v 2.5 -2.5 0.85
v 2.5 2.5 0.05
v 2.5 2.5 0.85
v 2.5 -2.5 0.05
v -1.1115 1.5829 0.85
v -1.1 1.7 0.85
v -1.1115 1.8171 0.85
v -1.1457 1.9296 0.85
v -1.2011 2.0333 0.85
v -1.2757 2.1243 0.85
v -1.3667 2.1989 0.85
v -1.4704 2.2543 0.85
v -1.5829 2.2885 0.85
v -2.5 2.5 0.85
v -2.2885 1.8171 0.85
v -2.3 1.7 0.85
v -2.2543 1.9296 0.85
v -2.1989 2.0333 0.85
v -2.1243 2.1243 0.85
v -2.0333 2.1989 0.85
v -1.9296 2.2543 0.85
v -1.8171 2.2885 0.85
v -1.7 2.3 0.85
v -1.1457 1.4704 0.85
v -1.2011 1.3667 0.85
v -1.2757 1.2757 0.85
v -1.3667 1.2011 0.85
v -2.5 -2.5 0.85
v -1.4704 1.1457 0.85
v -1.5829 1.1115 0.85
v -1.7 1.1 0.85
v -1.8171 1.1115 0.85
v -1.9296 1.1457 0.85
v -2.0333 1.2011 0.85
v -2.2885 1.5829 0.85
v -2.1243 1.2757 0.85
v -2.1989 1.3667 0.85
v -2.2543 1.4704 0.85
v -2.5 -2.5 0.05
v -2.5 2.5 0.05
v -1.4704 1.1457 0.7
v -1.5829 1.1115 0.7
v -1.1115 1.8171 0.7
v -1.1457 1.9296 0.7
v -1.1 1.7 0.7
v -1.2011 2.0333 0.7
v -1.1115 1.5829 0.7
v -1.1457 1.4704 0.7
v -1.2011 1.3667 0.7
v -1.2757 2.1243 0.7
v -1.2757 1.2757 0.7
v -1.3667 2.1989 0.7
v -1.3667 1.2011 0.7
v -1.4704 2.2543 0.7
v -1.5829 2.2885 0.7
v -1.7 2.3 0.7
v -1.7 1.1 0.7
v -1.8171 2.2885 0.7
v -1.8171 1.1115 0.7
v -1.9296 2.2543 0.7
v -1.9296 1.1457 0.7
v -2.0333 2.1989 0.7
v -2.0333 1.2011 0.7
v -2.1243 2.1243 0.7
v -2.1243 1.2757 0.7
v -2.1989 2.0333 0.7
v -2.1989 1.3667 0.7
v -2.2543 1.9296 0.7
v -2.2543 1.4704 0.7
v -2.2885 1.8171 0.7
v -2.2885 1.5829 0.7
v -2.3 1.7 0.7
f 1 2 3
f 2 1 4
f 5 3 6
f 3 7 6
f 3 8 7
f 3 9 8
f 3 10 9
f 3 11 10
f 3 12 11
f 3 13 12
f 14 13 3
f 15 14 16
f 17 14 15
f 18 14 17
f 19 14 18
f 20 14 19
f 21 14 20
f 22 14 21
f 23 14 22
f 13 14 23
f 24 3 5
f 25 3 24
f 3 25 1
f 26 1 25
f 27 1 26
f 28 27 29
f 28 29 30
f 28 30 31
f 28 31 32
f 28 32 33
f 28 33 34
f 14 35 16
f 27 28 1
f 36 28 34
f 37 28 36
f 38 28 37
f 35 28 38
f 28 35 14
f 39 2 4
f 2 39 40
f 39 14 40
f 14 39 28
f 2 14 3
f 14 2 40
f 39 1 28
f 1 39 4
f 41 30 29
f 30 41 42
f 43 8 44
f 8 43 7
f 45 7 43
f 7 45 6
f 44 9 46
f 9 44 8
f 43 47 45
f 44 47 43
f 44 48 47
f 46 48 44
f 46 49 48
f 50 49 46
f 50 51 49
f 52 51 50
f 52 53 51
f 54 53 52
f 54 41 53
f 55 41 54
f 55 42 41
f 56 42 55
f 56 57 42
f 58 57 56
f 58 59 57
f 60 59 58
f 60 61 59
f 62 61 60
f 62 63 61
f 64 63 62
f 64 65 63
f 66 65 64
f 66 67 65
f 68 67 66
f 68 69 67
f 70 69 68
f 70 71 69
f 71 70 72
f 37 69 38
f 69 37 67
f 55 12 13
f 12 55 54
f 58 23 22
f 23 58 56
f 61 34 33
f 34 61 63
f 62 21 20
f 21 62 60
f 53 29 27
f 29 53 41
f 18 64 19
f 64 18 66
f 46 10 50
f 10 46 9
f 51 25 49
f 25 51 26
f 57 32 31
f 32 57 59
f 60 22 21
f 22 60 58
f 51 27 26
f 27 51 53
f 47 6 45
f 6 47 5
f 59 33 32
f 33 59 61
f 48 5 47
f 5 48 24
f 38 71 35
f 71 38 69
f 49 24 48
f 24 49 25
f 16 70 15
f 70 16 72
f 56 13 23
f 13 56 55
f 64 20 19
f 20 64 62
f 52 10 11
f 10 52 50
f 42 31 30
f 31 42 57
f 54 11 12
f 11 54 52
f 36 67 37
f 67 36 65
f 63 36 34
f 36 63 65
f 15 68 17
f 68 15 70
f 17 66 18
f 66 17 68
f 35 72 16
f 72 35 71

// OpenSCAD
// ZHONGKEWEI AT6558R-5N32: QFN-40, 5 x 5 x 0.8 mm.
//
// Perimeter only - the 40 side terminals and the exposed pad are not
// modelled. Authored in KiCad 3D model space (Y is the footprint's Y
// negated, Z is height above the board).

$fn = 32;

BODY = 5.0;
HEIGHT = 0.8;
STANDOFF = 0.05;
PIN1_R = 0.6;   // dimple over pin 1, footprint (-2.44, -1.8)

module qfn40() {
    difference() {
        translate([-BODY / 2, -BODY / 2, STANDOFF])
            cube([BODY, BODY, HEIGHT]);
        translate([-1.7, 1.7, STANDOFF + HEIGHT - 0.15])
            cylinder(r = PIN1_R, h = 0.3);
    }
}

qfn40();
